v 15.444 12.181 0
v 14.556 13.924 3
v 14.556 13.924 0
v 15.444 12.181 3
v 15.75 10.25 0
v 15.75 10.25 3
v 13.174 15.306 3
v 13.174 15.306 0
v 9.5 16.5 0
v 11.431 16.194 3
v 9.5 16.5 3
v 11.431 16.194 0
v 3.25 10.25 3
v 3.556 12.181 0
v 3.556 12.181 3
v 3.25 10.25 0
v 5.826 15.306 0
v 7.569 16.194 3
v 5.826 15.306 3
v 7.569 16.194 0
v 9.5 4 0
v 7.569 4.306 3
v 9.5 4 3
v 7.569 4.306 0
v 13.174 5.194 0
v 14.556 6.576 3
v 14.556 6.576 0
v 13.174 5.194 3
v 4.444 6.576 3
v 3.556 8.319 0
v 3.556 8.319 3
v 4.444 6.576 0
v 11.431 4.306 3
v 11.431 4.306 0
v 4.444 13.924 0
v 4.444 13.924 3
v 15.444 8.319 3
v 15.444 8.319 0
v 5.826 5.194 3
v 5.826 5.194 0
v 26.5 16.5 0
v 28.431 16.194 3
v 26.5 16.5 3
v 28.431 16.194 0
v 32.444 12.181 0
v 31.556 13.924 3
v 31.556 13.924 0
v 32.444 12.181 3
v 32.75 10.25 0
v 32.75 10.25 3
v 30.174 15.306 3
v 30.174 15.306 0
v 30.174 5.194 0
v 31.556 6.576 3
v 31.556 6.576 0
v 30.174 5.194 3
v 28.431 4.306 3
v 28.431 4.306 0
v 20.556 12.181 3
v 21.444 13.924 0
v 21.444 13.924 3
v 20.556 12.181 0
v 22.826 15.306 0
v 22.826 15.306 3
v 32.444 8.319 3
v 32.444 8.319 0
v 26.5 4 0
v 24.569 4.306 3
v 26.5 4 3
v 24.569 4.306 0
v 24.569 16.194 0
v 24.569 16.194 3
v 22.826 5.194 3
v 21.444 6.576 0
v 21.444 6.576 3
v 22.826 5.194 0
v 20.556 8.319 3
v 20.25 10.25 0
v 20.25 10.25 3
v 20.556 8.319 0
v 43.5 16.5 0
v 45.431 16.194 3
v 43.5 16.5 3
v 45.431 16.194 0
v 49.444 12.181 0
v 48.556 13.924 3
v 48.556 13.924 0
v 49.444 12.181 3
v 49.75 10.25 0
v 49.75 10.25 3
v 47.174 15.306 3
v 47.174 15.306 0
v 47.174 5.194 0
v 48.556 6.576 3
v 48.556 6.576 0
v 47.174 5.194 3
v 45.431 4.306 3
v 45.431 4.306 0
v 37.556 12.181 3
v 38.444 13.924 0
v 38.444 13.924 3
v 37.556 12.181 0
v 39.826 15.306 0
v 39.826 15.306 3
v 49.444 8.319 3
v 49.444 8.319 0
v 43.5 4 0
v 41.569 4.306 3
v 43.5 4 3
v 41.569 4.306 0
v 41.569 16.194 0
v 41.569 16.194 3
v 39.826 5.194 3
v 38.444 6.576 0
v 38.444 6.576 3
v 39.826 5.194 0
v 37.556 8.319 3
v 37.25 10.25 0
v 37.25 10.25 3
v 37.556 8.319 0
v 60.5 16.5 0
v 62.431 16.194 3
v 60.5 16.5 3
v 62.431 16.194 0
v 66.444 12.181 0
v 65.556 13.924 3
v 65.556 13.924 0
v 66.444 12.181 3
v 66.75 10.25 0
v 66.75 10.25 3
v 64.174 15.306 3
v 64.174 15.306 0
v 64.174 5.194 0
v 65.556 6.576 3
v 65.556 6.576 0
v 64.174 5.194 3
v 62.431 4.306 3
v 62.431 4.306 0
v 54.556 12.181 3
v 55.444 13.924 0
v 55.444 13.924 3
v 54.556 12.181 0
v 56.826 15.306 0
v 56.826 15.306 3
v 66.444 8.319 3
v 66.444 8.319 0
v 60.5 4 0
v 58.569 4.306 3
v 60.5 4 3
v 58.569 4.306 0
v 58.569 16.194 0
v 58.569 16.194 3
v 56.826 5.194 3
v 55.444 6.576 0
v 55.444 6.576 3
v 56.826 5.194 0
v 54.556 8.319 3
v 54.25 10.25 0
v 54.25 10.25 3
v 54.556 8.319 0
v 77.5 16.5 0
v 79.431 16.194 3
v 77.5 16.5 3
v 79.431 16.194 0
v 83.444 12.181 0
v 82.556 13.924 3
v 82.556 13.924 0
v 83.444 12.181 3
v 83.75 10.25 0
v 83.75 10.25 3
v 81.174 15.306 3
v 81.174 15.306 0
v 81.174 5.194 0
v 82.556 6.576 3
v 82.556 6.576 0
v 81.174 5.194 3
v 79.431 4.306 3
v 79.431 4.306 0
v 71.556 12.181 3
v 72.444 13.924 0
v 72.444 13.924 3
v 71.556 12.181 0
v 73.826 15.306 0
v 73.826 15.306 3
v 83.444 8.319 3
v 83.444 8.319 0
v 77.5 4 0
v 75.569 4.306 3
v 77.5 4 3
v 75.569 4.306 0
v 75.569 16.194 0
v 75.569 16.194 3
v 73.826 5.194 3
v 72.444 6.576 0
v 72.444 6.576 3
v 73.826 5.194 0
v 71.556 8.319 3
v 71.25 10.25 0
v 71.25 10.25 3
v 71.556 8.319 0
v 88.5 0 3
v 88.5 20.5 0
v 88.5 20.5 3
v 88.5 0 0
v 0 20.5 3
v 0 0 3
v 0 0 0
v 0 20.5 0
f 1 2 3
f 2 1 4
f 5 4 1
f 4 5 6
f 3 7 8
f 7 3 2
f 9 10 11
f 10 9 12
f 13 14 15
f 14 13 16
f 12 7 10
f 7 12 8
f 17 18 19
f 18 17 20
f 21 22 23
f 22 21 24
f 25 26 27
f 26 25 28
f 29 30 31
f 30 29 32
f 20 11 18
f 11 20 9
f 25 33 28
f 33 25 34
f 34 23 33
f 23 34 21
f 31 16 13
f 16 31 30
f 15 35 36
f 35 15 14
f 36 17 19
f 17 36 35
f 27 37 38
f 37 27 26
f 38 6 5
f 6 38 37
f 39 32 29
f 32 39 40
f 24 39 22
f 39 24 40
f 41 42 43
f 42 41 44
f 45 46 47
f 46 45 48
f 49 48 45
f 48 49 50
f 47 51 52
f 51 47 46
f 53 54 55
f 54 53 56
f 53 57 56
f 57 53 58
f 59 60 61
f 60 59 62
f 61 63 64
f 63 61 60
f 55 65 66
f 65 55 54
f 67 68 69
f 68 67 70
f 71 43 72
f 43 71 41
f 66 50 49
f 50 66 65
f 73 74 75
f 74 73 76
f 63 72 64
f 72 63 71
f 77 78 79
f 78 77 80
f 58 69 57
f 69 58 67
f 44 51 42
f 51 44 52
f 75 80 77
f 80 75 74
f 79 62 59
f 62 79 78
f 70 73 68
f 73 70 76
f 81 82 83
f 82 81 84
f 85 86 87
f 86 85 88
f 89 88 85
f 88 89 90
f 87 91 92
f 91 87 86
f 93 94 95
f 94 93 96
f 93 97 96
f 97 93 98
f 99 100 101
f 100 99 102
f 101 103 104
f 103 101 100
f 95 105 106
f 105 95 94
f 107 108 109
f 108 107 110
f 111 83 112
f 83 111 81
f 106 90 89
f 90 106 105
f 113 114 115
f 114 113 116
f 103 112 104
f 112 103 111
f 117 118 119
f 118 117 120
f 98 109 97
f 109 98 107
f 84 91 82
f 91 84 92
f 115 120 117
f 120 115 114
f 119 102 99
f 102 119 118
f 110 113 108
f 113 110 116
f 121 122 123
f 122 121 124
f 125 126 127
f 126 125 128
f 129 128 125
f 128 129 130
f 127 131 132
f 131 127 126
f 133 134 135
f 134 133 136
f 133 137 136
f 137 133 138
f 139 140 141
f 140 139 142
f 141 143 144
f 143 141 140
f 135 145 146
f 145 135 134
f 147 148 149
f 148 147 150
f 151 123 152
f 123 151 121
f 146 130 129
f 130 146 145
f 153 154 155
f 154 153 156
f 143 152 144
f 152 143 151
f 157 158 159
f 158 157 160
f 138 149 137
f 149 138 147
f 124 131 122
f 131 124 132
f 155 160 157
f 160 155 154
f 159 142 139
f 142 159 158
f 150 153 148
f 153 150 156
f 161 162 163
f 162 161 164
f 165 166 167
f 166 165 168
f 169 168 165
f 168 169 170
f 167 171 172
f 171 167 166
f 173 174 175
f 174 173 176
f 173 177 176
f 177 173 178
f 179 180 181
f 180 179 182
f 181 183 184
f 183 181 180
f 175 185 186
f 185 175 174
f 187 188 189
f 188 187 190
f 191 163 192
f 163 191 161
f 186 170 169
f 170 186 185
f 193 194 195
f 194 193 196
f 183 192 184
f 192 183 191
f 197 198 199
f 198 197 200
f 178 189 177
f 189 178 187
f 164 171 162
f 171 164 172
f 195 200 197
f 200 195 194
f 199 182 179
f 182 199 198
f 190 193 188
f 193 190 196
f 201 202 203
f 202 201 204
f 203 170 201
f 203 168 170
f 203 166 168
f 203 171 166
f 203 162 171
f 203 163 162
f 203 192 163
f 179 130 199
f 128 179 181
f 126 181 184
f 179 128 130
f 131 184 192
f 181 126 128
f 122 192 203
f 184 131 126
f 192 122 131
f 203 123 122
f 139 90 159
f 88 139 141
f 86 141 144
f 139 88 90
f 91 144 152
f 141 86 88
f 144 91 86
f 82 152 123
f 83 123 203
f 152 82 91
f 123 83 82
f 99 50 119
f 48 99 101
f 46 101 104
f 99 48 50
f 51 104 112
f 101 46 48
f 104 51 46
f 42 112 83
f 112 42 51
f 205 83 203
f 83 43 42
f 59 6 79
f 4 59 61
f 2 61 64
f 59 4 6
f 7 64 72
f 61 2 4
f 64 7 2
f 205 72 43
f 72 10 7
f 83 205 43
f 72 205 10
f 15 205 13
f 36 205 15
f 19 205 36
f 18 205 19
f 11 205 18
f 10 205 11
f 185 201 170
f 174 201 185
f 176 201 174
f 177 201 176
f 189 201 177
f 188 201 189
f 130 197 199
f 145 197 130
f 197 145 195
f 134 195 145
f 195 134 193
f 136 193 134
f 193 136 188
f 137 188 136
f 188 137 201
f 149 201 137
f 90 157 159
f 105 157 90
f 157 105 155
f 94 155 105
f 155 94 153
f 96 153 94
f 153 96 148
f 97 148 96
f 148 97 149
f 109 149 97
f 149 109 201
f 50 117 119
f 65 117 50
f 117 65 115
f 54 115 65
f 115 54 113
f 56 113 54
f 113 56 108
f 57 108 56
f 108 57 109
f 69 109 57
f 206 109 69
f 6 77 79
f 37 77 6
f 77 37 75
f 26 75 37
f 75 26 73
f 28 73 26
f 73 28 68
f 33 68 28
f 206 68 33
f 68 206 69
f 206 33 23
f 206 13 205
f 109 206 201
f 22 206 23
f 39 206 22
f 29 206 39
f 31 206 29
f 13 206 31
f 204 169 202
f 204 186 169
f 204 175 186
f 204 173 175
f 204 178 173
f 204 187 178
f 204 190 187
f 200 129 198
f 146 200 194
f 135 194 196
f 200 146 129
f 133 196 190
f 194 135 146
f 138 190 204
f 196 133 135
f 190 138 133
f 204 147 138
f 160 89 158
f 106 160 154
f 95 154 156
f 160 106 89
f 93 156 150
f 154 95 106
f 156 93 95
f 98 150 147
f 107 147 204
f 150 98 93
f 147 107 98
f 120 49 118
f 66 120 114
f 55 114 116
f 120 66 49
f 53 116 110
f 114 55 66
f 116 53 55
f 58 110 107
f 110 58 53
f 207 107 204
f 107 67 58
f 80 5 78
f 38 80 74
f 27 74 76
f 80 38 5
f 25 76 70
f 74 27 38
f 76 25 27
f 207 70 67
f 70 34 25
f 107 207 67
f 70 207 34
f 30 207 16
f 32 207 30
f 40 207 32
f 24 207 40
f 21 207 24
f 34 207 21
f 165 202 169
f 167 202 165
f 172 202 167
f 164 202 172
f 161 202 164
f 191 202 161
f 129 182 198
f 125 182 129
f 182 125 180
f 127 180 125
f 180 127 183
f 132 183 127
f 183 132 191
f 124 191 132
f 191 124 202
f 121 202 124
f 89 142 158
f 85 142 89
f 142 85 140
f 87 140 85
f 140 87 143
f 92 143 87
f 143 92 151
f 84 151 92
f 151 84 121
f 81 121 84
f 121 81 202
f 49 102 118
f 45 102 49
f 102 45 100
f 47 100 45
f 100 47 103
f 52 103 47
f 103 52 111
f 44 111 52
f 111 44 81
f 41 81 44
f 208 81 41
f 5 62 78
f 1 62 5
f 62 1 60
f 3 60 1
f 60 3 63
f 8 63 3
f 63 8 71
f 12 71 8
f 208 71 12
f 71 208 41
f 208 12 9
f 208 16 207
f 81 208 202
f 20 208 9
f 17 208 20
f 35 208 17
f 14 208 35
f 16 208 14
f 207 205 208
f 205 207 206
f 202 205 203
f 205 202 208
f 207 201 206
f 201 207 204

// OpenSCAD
// Customisable parameters

button_count = 5; // how many buttons?
button_radius = 5.5; // radius of pressable part of button
button_spacing = 17; // centre-to-centre distance of buttons

case_edge_margin = 4; // how much space around the edge of the buttons?
case_depth = 3; // how thick should the case be?


// Derived & constant parameters

nudge = 0.75; // to ensure buttons fit in holes
hole_radius = button_radius + nudge;
epsilon = 0.001; // to ensure CSG subtraction works ok

hole_diameter = 2 * hole_radius;
space_count = button_count - 1;

case_width = hole_diameter + (2 * case_edge_margin);
case_length = (space_count * button_spacing)
            + hole_diameter
            + (2 * case_edge_margin);

difference() {
    cube([case_length, case_width, case_depth]);
    translate([(case_edge_margin + button_radius), case_width / 2, -epsilon]) {
        translate([0, 0, 0]) {
            for(button = [0:1:button_count-1]) {
                translate([(button_spacing * button), 0, 0]) {
                    cylinder(h = 3 * case_depth, r = hole_radius, center = true);
                }
            }
        }
    }
}
